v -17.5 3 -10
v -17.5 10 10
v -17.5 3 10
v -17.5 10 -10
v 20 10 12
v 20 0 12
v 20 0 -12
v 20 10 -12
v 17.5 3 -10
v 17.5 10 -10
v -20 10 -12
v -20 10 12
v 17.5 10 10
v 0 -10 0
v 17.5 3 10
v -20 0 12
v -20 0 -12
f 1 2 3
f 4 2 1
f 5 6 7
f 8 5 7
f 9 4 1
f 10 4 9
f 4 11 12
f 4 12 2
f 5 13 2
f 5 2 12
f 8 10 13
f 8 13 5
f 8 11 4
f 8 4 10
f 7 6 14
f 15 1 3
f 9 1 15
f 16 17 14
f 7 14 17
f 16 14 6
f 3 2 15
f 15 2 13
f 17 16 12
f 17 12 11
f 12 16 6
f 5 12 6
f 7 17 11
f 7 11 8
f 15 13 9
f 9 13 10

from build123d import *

# Parameters (mm, degrees)
SKETCH2_W           = 40
SKETCH2_H           = 24
BOSS_EXTRUDE1_DEPTH = 10
SKETCH3_W           = 35
SKETCH3_H           = 20
CUT_EXTRUDE1_DEPTH  = 7


with BuildPart() as part:
    # Sketch2 → Boss-Extrude1 (new body)
    with BuildSketch(Plane(origin=(0, 0, 0), x_dir=(1, 0, 0), z_dir=(0, 1, 0))):
        Rectangle(SKETCH2_W, SKETCH2_H)
    extrude(amount=BOSS_EXTRUDE1_DEPTH)

    # Sketch3 → Cut-Extrude1 (cut)
    with BuildSketch(Plane(origin=(0, 10, 0), x_dir=(1, 0, 0), z_dir=(0, 1, 0))):
        Rectangle(SKETCH3_W, SKETCH3_H)
    extrude(amount=-CUT_EXTRUDE1_DEPTH, mode=Mode.SUBTRACT)

    # Sketch9 → Loft1 section 0
    with BuildSketch(Plane.XZ, mode=Mode.PRIVATE) as loft1_s0:
        with BuildLine():
            Line((20, -12), (-20, -12))
            Line((-20, -12), (-20, 12))
            Line((-20, 12), (20, 12))
            Line((20, 12), (20, -12))
        make_face()
    loft([loft1_s0.sketch, Vertex(0, -10, 0)])


solid = part.part
